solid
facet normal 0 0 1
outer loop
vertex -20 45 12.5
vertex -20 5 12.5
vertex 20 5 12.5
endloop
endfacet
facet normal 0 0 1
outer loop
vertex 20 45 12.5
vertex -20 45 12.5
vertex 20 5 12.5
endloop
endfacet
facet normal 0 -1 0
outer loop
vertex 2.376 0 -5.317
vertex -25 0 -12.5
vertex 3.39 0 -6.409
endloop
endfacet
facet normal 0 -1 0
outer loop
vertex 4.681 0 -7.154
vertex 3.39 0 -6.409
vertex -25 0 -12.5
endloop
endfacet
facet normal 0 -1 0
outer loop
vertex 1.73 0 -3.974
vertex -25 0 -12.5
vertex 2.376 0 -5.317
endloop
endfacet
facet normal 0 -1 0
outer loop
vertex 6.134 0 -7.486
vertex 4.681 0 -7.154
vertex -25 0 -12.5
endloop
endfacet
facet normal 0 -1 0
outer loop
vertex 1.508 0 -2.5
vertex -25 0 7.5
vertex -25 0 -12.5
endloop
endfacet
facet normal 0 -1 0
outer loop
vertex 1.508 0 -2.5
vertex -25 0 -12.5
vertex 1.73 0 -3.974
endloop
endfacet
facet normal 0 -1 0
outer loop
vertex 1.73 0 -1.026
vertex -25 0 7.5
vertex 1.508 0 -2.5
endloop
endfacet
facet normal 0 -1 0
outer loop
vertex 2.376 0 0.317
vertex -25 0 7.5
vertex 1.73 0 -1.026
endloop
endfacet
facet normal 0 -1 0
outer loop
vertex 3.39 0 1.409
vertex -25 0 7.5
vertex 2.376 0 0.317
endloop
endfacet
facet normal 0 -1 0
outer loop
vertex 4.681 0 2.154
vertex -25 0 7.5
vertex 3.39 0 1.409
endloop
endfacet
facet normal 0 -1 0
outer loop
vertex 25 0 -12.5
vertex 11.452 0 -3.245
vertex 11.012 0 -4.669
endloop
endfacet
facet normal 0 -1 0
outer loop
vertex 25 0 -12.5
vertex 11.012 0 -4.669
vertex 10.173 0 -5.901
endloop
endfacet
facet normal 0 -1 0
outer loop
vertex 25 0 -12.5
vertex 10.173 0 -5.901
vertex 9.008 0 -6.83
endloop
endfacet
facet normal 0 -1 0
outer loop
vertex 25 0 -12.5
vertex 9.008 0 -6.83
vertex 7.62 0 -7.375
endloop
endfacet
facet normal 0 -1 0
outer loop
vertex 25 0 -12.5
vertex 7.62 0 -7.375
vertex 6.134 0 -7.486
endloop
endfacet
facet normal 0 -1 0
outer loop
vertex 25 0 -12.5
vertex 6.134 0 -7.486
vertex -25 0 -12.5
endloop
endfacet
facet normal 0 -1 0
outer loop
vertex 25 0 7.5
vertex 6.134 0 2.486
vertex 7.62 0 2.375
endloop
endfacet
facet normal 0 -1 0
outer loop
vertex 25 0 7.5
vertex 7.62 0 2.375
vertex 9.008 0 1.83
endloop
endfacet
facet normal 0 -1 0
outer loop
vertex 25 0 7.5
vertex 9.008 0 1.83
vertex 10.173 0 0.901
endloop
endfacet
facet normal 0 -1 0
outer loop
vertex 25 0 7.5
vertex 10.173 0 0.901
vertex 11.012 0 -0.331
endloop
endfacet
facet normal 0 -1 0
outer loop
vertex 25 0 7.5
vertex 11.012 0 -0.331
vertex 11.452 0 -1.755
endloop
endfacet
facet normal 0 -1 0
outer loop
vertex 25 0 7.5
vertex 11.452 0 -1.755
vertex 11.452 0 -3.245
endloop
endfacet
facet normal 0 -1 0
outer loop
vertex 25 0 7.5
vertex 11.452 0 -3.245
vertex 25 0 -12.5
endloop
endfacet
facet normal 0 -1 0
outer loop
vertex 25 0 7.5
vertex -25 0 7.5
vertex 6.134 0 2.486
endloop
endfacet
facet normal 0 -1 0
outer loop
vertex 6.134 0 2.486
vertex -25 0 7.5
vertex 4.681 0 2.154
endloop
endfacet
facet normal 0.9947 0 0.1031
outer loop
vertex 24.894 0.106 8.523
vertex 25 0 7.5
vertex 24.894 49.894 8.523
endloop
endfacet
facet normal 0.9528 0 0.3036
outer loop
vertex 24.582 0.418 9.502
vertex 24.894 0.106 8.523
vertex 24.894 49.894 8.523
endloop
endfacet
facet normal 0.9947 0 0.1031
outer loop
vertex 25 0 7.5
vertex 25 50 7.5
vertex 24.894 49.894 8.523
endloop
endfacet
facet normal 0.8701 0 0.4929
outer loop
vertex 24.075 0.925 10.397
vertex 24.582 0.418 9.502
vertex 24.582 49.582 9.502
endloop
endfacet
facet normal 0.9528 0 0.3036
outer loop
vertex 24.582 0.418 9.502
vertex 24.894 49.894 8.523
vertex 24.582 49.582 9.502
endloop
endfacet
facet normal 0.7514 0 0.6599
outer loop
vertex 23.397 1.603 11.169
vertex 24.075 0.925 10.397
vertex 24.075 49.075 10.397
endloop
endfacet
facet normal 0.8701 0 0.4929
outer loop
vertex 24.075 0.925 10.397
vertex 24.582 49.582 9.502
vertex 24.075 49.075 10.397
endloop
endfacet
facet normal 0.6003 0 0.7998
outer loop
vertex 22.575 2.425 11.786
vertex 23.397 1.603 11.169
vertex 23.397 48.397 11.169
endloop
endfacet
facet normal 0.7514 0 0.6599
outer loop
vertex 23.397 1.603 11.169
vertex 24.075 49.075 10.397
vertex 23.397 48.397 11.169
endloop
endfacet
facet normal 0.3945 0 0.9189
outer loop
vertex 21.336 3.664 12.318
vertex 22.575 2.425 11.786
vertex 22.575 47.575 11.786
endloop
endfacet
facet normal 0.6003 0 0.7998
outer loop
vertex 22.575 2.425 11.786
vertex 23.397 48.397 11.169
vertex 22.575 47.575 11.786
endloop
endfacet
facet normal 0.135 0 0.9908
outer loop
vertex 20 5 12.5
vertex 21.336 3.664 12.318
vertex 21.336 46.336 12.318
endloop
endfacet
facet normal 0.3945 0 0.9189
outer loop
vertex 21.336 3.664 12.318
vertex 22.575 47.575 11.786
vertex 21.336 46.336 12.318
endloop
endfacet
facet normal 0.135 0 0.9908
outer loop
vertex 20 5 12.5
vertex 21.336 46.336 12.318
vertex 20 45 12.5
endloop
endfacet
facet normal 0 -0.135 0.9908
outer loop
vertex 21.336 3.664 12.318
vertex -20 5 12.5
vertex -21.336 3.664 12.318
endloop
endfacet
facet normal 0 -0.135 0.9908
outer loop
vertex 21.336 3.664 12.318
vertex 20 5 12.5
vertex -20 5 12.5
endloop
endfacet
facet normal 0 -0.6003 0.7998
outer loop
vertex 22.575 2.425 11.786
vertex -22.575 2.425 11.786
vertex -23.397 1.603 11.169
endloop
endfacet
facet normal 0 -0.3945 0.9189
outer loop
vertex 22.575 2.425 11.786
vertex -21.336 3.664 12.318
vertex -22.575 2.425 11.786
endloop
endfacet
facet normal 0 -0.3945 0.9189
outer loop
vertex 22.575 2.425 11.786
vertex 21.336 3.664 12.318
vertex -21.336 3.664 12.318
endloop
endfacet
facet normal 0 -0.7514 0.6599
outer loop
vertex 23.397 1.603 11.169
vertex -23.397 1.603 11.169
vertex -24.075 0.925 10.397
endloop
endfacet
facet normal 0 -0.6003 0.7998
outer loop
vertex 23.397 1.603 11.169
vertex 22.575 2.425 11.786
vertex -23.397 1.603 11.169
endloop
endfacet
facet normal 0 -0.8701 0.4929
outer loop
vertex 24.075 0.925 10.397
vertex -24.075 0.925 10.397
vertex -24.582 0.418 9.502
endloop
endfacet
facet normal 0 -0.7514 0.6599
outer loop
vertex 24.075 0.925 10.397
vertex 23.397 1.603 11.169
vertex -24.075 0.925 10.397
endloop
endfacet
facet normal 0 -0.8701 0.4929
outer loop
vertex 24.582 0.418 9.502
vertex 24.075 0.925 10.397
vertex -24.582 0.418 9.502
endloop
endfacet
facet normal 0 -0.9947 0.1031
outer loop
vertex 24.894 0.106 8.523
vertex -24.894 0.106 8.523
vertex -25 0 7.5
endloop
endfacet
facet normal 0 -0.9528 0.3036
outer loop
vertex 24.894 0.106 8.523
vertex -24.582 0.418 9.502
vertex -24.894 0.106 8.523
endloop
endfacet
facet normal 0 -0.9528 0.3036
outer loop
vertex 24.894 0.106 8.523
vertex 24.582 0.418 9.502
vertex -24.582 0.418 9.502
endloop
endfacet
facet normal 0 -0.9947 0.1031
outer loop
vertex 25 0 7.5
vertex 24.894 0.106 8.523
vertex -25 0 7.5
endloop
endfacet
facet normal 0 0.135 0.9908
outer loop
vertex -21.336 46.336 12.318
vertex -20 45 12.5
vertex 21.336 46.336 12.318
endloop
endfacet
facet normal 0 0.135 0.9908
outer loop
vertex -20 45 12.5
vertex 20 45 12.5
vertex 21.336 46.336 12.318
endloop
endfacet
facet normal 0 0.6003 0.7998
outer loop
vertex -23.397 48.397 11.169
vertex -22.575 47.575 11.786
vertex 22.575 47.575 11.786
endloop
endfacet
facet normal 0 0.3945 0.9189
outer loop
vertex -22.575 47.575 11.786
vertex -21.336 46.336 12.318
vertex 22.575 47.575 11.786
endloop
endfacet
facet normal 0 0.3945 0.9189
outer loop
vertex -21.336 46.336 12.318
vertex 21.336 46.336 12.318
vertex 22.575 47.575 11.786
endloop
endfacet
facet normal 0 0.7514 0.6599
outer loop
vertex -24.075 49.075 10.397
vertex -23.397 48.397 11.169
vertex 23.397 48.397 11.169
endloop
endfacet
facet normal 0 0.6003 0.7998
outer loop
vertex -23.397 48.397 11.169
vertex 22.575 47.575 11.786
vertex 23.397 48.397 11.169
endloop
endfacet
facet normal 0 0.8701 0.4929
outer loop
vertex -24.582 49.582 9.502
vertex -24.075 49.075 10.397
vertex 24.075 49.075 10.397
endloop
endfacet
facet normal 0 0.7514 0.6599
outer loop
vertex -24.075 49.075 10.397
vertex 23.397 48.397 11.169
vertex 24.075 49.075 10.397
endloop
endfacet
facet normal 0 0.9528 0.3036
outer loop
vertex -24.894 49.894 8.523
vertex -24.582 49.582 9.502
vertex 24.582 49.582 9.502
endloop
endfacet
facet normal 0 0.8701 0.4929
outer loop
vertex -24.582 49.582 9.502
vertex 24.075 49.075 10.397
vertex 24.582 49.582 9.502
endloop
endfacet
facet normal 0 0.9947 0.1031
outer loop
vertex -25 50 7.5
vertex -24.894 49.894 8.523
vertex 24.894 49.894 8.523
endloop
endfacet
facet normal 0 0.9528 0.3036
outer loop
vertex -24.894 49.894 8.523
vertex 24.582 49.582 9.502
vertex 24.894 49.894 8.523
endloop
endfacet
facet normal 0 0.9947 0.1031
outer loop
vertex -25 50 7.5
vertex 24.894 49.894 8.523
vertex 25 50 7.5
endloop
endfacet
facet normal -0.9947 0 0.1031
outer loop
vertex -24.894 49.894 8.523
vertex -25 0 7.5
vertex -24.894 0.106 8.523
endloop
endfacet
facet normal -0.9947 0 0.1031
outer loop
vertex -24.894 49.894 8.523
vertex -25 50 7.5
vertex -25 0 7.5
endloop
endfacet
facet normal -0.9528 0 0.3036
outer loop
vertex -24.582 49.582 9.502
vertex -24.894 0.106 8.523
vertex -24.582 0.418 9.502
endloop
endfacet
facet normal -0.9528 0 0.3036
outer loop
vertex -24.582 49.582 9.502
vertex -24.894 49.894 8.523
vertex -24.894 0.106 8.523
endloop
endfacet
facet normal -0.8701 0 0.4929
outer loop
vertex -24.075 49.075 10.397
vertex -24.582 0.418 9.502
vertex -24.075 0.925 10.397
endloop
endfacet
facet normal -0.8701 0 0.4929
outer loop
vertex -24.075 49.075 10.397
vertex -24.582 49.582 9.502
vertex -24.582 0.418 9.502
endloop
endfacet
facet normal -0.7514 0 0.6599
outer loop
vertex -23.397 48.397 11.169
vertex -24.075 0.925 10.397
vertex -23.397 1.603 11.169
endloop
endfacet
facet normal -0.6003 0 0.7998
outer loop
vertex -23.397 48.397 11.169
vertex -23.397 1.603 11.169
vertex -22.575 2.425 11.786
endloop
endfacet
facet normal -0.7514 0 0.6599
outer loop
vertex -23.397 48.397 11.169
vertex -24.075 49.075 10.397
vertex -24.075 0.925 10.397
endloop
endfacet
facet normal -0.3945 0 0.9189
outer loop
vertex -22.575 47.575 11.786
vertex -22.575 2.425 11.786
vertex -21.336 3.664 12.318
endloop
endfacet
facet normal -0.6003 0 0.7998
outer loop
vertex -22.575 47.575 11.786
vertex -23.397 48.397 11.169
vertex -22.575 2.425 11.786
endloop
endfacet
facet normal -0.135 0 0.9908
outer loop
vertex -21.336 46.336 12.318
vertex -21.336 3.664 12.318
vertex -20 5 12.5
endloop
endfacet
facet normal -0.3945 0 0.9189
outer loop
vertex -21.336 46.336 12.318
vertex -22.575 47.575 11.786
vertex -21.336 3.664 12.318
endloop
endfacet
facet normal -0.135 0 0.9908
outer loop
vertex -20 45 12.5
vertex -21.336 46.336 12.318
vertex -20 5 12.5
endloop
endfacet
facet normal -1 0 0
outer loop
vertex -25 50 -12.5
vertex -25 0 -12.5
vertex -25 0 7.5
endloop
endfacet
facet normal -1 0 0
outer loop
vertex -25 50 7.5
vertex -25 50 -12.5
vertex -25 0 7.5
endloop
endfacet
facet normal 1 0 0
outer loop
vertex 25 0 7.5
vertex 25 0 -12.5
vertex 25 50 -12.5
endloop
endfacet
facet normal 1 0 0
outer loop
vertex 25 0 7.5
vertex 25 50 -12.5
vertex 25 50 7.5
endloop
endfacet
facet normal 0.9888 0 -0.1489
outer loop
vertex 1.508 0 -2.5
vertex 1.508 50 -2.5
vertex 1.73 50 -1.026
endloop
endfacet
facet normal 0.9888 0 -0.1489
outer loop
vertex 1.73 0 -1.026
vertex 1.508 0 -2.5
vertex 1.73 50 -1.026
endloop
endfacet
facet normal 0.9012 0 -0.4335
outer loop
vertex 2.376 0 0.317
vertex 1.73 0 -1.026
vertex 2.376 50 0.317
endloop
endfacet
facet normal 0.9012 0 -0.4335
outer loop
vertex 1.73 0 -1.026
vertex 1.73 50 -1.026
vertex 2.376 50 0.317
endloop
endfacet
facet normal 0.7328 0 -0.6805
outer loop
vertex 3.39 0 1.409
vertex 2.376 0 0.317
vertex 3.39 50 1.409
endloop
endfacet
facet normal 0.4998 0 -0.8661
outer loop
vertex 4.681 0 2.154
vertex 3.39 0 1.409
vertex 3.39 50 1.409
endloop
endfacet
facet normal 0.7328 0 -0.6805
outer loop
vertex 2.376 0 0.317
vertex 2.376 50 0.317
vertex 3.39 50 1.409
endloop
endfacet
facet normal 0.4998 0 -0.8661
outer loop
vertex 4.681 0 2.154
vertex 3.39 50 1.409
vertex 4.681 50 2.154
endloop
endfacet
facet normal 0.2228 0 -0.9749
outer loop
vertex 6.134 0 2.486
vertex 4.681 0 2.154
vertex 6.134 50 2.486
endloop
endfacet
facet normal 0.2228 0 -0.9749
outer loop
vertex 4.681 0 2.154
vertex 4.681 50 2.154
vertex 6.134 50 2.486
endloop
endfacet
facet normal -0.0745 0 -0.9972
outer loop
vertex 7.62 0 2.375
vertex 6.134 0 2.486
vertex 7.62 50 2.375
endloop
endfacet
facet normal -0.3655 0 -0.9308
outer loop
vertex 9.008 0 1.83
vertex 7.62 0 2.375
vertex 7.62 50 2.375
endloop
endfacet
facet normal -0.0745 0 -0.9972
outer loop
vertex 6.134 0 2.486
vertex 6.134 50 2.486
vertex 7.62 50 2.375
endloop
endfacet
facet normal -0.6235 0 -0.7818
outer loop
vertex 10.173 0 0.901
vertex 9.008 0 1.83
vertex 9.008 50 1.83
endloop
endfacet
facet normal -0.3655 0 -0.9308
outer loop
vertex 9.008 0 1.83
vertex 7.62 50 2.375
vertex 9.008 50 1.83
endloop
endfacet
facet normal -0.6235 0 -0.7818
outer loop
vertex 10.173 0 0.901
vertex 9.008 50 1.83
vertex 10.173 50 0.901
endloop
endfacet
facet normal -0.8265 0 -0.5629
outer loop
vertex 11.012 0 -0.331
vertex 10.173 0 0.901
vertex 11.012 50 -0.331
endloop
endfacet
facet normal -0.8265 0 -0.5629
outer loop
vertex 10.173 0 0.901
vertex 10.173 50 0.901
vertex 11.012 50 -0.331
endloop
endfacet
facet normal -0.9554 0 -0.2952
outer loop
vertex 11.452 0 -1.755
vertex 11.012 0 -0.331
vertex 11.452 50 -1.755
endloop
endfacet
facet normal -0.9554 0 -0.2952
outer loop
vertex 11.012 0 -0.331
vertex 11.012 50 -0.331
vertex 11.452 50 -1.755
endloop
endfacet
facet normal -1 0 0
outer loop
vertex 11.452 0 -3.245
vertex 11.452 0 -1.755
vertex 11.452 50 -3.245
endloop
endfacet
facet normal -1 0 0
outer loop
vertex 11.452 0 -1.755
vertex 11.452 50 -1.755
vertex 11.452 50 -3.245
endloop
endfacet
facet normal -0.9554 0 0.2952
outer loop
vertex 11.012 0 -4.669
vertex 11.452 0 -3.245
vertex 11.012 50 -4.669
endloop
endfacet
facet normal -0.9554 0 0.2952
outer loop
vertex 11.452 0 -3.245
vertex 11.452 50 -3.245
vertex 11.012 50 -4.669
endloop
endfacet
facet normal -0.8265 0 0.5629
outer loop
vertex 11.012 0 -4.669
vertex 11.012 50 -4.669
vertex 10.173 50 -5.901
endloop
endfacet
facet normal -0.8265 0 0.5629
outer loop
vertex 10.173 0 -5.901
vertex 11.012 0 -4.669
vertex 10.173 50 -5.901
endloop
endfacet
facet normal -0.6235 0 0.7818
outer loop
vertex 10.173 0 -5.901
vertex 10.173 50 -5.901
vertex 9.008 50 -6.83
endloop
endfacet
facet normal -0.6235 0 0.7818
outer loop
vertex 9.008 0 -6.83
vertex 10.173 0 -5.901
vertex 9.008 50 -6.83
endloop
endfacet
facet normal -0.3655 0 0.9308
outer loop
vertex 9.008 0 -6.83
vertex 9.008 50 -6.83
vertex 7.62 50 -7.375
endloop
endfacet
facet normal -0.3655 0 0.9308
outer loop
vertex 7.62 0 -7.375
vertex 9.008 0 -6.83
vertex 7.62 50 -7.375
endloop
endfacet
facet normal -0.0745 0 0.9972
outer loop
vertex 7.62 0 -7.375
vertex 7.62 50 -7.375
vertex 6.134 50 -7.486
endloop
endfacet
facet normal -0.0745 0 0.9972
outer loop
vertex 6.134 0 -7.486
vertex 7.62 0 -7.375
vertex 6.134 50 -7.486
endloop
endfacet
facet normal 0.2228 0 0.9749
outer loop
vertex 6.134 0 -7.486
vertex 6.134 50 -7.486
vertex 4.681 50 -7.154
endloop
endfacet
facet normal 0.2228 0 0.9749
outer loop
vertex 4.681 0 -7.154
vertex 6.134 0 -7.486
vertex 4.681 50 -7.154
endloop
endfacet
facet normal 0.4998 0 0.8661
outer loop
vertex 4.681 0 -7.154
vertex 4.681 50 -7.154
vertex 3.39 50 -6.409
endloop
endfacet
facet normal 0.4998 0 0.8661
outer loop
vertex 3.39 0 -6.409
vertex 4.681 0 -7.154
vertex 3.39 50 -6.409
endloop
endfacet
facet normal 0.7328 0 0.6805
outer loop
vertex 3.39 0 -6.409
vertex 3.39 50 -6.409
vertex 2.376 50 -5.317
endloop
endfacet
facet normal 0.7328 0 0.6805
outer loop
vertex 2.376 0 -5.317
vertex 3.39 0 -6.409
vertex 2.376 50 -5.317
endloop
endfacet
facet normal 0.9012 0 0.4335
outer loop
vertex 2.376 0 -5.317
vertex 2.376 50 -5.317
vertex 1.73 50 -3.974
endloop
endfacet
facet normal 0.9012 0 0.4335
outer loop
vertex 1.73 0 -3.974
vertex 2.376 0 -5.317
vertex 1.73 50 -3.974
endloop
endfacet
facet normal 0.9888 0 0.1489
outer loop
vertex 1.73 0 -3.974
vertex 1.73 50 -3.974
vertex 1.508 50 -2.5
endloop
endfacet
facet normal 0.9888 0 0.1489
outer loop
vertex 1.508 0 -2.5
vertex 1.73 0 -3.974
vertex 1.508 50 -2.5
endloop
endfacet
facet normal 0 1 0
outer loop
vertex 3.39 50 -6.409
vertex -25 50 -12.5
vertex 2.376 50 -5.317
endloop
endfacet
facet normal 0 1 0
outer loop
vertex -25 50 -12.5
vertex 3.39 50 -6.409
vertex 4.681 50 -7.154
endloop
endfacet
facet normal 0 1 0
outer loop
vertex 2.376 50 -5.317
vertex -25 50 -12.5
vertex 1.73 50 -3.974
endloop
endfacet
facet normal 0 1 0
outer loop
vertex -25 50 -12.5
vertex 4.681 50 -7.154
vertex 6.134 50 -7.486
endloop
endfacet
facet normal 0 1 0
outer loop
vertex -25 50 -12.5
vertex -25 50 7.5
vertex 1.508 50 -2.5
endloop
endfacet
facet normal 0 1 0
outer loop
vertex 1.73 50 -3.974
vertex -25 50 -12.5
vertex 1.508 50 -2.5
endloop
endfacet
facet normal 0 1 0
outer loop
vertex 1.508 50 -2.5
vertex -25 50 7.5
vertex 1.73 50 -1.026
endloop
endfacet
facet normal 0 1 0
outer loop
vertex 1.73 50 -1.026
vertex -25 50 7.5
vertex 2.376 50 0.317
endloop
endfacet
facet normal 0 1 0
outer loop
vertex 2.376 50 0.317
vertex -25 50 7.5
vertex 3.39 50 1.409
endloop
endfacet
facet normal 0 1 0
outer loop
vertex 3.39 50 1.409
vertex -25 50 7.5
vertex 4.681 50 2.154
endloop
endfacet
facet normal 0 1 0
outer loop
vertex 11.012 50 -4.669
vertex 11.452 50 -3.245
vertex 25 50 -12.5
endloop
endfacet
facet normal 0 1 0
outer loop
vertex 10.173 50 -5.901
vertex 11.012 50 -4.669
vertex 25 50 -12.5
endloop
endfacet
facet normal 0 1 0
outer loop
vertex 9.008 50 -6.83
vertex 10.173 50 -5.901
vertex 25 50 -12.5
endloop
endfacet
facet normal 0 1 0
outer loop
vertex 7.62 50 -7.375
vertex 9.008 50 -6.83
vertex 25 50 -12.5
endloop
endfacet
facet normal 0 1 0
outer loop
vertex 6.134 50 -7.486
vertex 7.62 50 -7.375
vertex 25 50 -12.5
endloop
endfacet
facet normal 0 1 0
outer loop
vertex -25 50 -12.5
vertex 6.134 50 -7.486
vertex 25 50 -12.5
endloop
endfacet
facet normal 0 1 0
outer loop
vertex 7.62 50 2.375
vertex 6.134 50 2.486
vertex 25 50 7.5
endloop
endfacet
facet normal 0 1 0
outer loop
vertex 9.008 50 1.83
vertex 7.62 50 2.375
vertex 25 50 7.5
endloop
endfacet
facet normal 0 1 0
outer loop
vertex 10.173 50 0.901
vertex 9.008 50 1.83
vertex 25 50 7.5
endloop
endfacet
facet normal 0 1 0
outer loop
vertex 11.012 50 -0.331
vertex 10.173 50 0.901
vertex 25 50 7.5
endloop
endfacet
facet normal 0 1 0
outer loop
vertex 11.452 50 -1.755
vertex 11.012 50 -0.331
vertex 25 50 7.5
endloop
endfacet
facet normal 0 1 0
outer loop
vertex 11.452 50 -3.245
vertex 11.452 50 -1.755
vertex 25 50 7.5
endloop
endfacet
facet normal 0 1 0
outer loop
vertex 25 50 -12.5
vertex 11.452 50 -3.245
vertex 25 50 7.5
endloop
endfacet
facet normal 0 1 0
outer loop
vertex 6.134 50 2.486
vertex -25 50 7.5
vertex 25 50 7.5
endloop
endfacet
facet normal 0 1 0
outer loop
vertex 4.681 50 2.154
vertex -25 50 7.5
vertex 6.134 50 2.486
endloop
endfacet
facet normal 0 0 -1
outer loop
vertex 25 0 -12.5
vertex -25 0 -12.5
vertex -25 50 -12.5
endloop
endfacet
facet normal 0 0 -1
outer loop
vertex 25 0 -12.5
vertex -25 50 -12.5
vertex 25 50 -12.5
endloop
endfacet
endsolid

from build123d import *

# Parameters (mm, degrees)
F0_W     = 50
F0_H     = 25
F1_DEPTH = 50
F2_R     = 5
F3_R     = 5
F4_DEPTH = 50.001


with BuildPart() as f1:
    # F0 (on Front) → F1 (new body)
    with BuildSketch(Plane.XZ):
        Rectangle(F0_W, F0_H)
    extrude(amount=-F1_DEPTH)

    # F2
    f2_edges = [f1.edges().sort_by_distance(p)[0] for p in [
        (-25, 25, 12.5),
        (25, 25, 12.5),
        (0, 0, 12.5),
        (0, 50, 12.5),
    ]]
    fillet(f2_edges, radius=F2_R)

    # F3 (on face) → F4 (cut, through all)
    with BuildSketch(Plane(origin=(0, 50, 0), x_dir=(-1, 0, 0), z_dir=(0, 1, 0))):
        with Locations((-6.507594, -2.5)):
            Circle(F3_R)
    extrude(amount=-F4_DEPTH, mode=Mode.SUBTRACT)


solid = f1.part
